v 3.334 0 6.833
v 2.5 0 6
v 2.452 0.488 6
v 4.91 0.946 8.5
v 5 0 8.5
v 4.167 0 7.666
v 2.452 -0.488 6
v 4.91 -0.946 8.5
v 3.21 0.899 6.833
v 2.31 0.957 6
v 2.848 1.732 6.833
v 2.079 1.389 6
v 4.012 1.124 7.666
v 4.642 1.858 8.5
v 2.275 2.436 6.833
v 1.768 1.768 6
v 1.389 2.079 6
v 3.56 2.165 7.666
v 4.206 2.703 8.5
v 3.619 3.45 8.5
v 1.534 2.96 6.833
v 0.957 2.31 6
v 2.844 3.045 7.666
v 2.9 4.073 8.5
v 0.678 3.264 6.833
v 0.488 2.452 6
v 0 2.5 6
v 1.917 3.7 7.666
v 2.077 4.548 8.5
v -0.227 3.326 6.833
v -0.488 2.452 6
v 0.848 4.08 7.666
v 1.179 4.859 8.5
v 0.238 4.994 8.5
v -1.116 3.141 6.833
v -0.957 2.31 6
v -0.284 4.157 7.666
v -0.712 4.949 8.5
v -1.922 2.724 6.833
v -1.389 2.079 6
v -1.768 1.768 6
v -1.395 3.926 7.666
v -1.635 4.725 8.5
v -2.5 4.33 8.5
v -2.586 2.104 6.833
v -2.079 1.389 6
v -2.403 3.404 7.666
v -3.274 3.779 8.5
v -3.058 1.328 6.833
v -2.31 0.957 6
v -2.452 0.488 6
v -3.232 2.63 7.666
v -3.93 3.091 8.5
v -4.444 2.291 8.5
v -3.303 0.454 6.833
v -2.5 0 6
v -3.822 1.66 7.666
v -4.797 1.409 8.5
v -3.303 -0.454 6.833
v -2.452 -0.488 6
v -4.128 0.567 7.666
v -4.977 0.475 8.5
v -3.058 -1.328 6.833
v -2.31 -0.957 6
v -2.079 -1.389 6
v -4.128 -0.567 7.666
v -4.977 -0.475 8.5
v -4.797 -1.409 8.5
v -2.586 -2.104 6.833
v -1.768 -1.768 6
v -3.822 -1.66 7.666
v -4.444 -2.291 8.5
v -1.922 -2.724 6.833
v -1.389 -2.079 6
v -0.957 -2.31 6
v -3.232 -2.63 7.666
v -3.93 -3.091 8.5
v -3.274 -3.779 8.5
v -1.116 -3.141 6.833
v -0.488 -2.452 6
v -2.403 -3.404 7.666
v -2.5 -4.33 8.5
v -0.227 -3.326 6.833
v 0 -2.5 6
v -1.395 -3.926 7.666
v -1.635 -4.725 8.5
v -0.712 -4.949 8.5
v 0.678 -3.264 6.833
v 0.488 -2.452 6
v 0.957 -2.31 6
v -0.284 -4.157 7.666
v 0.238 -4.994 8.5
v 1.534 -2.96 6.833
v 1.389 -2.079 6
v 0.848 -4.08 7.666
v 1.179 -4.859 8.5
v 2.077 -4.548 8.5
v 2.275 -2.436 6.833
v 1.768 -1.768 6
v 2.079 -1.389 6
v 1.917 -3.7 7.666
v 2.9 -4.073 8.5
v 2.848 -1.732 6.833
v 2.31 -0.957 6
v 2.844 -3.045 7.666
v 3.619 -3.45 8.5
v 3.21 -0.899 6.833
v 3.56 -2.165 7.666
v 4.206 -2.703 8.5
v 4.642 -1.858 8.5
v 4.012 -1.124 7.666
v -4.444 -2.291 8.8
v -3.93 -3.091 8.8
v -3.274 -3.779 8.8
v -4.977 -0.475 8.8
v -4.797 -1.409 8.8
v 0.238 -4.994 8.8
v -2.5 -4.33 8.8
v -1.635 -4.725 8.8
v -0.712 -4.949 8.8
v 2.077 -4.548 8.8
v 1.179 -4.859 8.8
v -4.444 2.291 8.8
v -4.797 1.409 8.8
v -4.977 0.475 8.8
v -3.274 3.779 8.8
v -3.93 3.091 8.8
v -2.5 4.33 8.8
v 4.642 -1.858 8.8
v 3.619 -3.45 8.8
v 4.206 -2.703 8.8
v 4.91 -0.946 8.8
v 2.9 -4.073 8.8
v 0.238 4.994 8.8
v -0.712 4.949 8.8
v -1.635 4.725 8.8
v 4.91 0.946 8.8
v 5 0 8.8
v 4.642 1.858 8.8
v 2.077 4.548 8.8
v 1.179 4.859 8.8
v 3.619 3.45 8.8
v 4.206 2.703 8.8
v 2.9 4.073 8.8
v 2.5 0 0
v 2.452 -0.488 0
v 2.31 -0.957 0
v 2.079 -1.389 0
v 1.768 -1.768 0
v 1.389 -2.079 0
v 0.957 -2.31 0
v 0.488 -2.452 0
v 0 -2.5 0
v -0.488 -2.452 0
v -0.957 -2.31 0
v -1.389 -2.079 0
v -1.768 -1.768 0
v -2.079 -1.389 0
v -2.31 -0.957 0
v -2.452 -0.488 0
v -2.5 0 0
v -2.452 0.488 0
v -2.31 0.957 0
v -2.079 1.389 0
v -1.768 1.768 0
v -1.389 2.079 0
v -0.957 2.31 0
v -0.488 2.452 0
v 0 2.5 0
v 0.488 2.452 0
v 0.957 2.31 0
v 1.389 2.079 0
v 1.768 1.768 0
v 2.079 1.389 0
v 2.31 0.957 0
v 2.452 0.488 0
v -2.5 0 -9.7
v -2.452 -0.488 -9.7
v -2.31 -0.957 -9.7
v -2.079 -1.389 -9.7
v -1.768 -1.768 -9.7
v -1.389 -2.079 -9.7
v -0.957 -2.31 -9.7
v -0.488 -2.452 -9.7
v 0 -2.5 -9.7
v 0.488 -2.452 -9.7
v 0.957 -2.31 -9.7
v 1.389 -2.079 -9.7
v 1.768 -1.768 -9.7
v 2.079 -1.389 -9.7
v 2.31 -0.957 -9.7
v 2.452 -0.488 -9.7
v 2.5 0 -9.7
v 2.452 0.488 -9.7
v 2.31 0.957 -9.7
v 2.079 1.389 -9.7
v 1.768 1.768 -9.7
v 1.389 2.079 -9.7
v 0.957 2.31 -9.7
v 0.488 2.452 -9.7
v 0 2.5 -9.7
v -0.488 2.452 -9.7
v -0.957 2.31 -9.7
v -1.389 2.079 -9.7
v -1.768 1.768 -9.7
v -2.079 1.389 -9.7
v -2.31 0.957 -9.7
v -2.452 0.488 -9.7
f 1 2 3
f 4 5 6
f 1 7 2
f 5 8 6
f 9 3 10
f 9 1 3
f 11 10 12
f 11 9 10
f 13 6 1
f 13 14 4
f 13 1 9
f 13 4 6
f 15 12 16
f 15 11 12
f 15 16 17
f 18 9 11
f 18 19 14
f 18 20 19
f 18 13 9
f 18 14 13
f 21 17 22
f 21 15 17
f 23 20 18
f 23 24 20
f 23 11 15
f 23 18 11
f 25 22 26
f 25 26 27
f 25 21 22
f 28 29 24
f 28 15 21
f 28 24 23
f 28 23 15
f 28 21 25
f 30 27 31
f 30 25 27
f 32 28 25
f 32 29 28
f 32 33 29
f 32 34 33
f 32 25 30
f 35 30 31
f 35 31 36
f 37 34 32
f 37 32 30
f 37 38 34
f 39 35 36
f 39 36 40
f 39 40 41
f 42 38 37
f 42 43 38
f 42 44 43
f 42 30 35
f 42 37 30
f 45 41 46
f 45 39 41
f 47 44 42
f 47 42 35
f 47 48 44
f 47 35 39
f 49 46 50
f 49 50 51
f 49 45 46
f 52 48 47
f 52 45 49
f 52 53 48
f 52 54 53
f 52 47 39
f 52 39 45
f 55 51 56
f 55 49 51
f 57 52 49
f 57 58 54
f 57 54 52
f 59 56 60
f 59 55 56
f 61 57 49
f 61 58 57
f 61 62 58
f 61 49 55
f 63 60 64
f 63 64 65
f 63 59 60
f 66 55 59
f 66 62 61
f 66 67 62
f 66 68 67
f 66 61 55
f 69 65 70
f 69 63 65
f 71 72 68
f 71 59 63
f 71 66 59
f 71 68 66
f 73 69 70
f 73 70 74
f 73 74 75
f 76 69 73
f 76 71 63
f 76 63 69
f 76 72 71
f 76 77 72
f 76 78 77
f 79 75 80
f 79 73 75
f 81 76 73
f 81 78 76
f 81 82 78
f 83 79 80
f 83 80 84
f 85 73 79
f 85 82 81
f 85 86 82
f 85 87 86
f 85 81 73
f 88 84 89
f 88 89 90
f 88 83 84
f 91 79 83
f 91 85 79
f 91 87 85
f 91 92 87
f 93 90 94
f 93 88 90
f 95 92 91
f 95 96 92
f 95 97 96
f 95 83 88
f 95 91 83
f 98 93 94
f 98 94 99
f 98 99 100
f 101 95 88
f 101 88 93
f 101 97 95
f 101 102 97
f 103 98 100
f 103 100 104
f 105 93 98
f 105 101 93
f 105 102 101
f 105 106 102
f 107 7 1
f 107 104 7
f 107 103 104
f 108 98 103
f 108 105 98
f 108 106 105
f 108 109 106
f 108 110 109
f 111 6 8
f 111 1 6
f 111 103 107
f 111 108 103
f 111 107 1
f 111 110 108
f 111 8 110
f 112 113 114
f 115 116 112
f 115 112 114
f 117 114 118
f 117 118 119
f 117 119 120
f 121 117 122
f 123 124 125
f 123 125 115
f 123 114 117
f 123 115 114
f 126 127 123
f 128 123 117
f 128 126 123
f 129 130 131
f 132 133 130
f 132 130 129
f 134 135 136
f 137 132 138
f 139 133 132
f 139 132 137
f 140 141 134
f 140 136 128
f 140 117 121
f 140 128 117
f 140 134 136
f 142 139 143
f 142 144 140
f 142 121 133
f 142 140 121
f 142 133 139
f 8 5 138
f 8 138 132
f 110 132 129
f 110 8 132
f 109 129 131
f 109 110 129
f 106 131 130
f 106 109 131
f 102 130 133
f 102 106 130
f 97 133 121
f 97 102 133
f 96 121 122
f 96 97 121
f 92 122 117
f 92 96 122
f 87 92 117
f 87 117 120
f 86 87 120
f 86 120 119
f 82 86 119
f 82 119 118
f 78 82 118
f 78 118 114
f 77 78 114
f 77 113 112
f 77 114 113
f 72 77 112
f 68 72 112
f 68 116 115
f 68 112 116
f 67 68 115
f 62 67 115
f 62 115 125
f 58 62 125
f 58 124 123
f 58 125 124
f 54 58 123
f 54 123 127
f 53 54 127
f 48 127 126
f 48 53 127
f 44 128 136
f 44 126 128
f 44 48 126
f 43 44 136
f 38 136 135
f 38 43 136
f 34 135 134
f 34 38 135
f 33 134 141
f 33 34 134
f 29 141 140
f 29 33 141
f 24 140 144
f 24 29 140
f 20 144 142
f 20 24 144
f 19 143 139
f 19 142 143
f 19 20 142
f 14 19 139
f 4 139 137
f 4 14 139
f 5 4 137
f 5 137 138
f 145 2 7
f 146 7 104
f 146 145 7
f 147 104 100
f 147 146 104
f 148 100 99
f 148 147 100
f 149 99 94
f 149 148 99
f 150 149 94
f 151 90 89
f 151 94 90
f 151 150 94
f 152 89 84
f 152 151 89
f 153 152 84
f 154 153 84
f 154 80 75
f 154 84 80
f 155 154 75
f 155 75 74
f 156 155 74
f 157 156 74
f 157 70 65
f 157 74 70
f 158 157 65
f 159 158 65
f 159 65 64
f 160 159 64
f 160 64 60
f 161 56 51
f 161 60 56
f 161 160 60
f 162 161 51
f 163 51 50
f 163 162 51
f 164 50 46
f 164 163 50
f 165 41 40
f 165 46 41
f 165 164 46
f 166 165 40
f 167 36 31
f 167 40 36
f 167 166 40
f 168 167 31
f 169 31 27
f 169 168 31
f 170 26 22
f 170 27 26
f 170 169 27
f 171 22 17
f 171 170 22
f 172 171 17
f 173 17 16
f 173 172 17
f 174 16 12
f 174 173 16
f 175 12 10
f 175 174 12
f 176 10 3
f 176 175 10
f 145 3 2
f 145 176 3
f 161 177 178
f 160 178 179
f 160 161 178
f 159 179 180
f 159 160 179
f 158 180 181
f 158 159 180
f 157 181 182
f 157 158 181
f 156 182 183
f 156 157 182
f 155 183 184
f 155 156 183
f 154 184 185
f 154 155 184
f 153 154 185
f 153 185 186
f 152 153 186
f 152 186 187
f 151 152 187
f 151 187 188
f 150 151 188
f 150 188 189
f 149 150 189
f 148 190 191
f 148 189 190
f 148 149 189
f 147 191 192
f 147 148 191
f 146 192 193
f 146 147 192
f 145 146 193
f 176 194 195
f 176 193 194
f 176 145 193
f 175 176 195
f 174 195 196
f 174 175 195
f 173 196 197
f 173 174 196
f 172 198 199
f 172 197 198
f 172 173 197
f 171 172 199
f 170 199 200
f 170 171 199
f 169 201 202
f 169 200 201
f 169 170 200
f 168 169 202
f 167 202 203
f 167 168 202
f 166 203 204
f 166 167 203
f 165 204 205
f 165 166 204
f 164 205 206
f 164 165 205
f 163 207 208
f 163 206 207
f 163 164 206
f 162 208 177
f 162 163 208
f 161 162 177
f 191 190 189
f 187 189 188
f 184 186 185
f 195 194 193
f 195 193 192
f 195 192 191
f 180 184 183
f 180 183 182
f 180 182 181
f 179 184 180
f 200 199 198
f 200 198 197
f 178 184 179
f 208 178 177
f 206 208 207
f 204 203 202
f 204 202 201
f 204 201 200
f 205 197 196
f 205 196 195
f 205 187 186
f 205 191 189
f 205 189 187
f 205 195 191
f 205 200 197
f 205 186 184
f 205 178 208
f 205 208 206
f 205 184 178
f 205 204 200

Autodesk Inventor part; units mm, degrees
ref_plane "YZ Plane" through (0, 0, 0) normal (1, 0, 0) x (0, 1, 0)
ref_plane "XZ Plane" through (0, 0, 0) normal (0, 1, 0) x (-1, 0, 0)
ref_plane "XY Plane" through (0, 0, 0) normal (0, 0, 1) x (1, 0, 0)
sketch "スケッチ1" plane through (0, 0, 0) normal (0, 0, 1) x (1, 0, 0)
  circle A0 centre (0, 0) radius 2.5
  dimension "d0" = 5
extrude "押し出し1" add sketch "スケッチ1" along normal blind 6
sketch "スケッチ2" plane through (0, 0, 6) normal (0, 0, 1) x (1, 0, 0)
  circle A0 centre (0, 0) radius 2.5 projected
  circle A1 centre (0, 0) radius 5
  dimension "d3" = 10
extrude "押し出し2" add sketch "スケッチ2" along normal blind 2.8 contours A0 | A1
thread "ねじ1" size "M4x0.7" class "6g" standard "ANSI Metric M Profile" full length
chamfer "面取り1" distance 2.5 angle 45 1 edges at (-5, 0, 6)
sketch "スケッチ4" plane through (0, 0, 0) normal (0, 0, -1) x (-1, 0, 0)
  circle A0 centre (0, 0) radius 2.5
  dimension "d16" = 5
extrude "押し出し4" add sketch "スケッチ4" along normal blind 9.7
properties part number "SB　M5 18mm 皿ネジ" material "Stainless Steel, 440C"
